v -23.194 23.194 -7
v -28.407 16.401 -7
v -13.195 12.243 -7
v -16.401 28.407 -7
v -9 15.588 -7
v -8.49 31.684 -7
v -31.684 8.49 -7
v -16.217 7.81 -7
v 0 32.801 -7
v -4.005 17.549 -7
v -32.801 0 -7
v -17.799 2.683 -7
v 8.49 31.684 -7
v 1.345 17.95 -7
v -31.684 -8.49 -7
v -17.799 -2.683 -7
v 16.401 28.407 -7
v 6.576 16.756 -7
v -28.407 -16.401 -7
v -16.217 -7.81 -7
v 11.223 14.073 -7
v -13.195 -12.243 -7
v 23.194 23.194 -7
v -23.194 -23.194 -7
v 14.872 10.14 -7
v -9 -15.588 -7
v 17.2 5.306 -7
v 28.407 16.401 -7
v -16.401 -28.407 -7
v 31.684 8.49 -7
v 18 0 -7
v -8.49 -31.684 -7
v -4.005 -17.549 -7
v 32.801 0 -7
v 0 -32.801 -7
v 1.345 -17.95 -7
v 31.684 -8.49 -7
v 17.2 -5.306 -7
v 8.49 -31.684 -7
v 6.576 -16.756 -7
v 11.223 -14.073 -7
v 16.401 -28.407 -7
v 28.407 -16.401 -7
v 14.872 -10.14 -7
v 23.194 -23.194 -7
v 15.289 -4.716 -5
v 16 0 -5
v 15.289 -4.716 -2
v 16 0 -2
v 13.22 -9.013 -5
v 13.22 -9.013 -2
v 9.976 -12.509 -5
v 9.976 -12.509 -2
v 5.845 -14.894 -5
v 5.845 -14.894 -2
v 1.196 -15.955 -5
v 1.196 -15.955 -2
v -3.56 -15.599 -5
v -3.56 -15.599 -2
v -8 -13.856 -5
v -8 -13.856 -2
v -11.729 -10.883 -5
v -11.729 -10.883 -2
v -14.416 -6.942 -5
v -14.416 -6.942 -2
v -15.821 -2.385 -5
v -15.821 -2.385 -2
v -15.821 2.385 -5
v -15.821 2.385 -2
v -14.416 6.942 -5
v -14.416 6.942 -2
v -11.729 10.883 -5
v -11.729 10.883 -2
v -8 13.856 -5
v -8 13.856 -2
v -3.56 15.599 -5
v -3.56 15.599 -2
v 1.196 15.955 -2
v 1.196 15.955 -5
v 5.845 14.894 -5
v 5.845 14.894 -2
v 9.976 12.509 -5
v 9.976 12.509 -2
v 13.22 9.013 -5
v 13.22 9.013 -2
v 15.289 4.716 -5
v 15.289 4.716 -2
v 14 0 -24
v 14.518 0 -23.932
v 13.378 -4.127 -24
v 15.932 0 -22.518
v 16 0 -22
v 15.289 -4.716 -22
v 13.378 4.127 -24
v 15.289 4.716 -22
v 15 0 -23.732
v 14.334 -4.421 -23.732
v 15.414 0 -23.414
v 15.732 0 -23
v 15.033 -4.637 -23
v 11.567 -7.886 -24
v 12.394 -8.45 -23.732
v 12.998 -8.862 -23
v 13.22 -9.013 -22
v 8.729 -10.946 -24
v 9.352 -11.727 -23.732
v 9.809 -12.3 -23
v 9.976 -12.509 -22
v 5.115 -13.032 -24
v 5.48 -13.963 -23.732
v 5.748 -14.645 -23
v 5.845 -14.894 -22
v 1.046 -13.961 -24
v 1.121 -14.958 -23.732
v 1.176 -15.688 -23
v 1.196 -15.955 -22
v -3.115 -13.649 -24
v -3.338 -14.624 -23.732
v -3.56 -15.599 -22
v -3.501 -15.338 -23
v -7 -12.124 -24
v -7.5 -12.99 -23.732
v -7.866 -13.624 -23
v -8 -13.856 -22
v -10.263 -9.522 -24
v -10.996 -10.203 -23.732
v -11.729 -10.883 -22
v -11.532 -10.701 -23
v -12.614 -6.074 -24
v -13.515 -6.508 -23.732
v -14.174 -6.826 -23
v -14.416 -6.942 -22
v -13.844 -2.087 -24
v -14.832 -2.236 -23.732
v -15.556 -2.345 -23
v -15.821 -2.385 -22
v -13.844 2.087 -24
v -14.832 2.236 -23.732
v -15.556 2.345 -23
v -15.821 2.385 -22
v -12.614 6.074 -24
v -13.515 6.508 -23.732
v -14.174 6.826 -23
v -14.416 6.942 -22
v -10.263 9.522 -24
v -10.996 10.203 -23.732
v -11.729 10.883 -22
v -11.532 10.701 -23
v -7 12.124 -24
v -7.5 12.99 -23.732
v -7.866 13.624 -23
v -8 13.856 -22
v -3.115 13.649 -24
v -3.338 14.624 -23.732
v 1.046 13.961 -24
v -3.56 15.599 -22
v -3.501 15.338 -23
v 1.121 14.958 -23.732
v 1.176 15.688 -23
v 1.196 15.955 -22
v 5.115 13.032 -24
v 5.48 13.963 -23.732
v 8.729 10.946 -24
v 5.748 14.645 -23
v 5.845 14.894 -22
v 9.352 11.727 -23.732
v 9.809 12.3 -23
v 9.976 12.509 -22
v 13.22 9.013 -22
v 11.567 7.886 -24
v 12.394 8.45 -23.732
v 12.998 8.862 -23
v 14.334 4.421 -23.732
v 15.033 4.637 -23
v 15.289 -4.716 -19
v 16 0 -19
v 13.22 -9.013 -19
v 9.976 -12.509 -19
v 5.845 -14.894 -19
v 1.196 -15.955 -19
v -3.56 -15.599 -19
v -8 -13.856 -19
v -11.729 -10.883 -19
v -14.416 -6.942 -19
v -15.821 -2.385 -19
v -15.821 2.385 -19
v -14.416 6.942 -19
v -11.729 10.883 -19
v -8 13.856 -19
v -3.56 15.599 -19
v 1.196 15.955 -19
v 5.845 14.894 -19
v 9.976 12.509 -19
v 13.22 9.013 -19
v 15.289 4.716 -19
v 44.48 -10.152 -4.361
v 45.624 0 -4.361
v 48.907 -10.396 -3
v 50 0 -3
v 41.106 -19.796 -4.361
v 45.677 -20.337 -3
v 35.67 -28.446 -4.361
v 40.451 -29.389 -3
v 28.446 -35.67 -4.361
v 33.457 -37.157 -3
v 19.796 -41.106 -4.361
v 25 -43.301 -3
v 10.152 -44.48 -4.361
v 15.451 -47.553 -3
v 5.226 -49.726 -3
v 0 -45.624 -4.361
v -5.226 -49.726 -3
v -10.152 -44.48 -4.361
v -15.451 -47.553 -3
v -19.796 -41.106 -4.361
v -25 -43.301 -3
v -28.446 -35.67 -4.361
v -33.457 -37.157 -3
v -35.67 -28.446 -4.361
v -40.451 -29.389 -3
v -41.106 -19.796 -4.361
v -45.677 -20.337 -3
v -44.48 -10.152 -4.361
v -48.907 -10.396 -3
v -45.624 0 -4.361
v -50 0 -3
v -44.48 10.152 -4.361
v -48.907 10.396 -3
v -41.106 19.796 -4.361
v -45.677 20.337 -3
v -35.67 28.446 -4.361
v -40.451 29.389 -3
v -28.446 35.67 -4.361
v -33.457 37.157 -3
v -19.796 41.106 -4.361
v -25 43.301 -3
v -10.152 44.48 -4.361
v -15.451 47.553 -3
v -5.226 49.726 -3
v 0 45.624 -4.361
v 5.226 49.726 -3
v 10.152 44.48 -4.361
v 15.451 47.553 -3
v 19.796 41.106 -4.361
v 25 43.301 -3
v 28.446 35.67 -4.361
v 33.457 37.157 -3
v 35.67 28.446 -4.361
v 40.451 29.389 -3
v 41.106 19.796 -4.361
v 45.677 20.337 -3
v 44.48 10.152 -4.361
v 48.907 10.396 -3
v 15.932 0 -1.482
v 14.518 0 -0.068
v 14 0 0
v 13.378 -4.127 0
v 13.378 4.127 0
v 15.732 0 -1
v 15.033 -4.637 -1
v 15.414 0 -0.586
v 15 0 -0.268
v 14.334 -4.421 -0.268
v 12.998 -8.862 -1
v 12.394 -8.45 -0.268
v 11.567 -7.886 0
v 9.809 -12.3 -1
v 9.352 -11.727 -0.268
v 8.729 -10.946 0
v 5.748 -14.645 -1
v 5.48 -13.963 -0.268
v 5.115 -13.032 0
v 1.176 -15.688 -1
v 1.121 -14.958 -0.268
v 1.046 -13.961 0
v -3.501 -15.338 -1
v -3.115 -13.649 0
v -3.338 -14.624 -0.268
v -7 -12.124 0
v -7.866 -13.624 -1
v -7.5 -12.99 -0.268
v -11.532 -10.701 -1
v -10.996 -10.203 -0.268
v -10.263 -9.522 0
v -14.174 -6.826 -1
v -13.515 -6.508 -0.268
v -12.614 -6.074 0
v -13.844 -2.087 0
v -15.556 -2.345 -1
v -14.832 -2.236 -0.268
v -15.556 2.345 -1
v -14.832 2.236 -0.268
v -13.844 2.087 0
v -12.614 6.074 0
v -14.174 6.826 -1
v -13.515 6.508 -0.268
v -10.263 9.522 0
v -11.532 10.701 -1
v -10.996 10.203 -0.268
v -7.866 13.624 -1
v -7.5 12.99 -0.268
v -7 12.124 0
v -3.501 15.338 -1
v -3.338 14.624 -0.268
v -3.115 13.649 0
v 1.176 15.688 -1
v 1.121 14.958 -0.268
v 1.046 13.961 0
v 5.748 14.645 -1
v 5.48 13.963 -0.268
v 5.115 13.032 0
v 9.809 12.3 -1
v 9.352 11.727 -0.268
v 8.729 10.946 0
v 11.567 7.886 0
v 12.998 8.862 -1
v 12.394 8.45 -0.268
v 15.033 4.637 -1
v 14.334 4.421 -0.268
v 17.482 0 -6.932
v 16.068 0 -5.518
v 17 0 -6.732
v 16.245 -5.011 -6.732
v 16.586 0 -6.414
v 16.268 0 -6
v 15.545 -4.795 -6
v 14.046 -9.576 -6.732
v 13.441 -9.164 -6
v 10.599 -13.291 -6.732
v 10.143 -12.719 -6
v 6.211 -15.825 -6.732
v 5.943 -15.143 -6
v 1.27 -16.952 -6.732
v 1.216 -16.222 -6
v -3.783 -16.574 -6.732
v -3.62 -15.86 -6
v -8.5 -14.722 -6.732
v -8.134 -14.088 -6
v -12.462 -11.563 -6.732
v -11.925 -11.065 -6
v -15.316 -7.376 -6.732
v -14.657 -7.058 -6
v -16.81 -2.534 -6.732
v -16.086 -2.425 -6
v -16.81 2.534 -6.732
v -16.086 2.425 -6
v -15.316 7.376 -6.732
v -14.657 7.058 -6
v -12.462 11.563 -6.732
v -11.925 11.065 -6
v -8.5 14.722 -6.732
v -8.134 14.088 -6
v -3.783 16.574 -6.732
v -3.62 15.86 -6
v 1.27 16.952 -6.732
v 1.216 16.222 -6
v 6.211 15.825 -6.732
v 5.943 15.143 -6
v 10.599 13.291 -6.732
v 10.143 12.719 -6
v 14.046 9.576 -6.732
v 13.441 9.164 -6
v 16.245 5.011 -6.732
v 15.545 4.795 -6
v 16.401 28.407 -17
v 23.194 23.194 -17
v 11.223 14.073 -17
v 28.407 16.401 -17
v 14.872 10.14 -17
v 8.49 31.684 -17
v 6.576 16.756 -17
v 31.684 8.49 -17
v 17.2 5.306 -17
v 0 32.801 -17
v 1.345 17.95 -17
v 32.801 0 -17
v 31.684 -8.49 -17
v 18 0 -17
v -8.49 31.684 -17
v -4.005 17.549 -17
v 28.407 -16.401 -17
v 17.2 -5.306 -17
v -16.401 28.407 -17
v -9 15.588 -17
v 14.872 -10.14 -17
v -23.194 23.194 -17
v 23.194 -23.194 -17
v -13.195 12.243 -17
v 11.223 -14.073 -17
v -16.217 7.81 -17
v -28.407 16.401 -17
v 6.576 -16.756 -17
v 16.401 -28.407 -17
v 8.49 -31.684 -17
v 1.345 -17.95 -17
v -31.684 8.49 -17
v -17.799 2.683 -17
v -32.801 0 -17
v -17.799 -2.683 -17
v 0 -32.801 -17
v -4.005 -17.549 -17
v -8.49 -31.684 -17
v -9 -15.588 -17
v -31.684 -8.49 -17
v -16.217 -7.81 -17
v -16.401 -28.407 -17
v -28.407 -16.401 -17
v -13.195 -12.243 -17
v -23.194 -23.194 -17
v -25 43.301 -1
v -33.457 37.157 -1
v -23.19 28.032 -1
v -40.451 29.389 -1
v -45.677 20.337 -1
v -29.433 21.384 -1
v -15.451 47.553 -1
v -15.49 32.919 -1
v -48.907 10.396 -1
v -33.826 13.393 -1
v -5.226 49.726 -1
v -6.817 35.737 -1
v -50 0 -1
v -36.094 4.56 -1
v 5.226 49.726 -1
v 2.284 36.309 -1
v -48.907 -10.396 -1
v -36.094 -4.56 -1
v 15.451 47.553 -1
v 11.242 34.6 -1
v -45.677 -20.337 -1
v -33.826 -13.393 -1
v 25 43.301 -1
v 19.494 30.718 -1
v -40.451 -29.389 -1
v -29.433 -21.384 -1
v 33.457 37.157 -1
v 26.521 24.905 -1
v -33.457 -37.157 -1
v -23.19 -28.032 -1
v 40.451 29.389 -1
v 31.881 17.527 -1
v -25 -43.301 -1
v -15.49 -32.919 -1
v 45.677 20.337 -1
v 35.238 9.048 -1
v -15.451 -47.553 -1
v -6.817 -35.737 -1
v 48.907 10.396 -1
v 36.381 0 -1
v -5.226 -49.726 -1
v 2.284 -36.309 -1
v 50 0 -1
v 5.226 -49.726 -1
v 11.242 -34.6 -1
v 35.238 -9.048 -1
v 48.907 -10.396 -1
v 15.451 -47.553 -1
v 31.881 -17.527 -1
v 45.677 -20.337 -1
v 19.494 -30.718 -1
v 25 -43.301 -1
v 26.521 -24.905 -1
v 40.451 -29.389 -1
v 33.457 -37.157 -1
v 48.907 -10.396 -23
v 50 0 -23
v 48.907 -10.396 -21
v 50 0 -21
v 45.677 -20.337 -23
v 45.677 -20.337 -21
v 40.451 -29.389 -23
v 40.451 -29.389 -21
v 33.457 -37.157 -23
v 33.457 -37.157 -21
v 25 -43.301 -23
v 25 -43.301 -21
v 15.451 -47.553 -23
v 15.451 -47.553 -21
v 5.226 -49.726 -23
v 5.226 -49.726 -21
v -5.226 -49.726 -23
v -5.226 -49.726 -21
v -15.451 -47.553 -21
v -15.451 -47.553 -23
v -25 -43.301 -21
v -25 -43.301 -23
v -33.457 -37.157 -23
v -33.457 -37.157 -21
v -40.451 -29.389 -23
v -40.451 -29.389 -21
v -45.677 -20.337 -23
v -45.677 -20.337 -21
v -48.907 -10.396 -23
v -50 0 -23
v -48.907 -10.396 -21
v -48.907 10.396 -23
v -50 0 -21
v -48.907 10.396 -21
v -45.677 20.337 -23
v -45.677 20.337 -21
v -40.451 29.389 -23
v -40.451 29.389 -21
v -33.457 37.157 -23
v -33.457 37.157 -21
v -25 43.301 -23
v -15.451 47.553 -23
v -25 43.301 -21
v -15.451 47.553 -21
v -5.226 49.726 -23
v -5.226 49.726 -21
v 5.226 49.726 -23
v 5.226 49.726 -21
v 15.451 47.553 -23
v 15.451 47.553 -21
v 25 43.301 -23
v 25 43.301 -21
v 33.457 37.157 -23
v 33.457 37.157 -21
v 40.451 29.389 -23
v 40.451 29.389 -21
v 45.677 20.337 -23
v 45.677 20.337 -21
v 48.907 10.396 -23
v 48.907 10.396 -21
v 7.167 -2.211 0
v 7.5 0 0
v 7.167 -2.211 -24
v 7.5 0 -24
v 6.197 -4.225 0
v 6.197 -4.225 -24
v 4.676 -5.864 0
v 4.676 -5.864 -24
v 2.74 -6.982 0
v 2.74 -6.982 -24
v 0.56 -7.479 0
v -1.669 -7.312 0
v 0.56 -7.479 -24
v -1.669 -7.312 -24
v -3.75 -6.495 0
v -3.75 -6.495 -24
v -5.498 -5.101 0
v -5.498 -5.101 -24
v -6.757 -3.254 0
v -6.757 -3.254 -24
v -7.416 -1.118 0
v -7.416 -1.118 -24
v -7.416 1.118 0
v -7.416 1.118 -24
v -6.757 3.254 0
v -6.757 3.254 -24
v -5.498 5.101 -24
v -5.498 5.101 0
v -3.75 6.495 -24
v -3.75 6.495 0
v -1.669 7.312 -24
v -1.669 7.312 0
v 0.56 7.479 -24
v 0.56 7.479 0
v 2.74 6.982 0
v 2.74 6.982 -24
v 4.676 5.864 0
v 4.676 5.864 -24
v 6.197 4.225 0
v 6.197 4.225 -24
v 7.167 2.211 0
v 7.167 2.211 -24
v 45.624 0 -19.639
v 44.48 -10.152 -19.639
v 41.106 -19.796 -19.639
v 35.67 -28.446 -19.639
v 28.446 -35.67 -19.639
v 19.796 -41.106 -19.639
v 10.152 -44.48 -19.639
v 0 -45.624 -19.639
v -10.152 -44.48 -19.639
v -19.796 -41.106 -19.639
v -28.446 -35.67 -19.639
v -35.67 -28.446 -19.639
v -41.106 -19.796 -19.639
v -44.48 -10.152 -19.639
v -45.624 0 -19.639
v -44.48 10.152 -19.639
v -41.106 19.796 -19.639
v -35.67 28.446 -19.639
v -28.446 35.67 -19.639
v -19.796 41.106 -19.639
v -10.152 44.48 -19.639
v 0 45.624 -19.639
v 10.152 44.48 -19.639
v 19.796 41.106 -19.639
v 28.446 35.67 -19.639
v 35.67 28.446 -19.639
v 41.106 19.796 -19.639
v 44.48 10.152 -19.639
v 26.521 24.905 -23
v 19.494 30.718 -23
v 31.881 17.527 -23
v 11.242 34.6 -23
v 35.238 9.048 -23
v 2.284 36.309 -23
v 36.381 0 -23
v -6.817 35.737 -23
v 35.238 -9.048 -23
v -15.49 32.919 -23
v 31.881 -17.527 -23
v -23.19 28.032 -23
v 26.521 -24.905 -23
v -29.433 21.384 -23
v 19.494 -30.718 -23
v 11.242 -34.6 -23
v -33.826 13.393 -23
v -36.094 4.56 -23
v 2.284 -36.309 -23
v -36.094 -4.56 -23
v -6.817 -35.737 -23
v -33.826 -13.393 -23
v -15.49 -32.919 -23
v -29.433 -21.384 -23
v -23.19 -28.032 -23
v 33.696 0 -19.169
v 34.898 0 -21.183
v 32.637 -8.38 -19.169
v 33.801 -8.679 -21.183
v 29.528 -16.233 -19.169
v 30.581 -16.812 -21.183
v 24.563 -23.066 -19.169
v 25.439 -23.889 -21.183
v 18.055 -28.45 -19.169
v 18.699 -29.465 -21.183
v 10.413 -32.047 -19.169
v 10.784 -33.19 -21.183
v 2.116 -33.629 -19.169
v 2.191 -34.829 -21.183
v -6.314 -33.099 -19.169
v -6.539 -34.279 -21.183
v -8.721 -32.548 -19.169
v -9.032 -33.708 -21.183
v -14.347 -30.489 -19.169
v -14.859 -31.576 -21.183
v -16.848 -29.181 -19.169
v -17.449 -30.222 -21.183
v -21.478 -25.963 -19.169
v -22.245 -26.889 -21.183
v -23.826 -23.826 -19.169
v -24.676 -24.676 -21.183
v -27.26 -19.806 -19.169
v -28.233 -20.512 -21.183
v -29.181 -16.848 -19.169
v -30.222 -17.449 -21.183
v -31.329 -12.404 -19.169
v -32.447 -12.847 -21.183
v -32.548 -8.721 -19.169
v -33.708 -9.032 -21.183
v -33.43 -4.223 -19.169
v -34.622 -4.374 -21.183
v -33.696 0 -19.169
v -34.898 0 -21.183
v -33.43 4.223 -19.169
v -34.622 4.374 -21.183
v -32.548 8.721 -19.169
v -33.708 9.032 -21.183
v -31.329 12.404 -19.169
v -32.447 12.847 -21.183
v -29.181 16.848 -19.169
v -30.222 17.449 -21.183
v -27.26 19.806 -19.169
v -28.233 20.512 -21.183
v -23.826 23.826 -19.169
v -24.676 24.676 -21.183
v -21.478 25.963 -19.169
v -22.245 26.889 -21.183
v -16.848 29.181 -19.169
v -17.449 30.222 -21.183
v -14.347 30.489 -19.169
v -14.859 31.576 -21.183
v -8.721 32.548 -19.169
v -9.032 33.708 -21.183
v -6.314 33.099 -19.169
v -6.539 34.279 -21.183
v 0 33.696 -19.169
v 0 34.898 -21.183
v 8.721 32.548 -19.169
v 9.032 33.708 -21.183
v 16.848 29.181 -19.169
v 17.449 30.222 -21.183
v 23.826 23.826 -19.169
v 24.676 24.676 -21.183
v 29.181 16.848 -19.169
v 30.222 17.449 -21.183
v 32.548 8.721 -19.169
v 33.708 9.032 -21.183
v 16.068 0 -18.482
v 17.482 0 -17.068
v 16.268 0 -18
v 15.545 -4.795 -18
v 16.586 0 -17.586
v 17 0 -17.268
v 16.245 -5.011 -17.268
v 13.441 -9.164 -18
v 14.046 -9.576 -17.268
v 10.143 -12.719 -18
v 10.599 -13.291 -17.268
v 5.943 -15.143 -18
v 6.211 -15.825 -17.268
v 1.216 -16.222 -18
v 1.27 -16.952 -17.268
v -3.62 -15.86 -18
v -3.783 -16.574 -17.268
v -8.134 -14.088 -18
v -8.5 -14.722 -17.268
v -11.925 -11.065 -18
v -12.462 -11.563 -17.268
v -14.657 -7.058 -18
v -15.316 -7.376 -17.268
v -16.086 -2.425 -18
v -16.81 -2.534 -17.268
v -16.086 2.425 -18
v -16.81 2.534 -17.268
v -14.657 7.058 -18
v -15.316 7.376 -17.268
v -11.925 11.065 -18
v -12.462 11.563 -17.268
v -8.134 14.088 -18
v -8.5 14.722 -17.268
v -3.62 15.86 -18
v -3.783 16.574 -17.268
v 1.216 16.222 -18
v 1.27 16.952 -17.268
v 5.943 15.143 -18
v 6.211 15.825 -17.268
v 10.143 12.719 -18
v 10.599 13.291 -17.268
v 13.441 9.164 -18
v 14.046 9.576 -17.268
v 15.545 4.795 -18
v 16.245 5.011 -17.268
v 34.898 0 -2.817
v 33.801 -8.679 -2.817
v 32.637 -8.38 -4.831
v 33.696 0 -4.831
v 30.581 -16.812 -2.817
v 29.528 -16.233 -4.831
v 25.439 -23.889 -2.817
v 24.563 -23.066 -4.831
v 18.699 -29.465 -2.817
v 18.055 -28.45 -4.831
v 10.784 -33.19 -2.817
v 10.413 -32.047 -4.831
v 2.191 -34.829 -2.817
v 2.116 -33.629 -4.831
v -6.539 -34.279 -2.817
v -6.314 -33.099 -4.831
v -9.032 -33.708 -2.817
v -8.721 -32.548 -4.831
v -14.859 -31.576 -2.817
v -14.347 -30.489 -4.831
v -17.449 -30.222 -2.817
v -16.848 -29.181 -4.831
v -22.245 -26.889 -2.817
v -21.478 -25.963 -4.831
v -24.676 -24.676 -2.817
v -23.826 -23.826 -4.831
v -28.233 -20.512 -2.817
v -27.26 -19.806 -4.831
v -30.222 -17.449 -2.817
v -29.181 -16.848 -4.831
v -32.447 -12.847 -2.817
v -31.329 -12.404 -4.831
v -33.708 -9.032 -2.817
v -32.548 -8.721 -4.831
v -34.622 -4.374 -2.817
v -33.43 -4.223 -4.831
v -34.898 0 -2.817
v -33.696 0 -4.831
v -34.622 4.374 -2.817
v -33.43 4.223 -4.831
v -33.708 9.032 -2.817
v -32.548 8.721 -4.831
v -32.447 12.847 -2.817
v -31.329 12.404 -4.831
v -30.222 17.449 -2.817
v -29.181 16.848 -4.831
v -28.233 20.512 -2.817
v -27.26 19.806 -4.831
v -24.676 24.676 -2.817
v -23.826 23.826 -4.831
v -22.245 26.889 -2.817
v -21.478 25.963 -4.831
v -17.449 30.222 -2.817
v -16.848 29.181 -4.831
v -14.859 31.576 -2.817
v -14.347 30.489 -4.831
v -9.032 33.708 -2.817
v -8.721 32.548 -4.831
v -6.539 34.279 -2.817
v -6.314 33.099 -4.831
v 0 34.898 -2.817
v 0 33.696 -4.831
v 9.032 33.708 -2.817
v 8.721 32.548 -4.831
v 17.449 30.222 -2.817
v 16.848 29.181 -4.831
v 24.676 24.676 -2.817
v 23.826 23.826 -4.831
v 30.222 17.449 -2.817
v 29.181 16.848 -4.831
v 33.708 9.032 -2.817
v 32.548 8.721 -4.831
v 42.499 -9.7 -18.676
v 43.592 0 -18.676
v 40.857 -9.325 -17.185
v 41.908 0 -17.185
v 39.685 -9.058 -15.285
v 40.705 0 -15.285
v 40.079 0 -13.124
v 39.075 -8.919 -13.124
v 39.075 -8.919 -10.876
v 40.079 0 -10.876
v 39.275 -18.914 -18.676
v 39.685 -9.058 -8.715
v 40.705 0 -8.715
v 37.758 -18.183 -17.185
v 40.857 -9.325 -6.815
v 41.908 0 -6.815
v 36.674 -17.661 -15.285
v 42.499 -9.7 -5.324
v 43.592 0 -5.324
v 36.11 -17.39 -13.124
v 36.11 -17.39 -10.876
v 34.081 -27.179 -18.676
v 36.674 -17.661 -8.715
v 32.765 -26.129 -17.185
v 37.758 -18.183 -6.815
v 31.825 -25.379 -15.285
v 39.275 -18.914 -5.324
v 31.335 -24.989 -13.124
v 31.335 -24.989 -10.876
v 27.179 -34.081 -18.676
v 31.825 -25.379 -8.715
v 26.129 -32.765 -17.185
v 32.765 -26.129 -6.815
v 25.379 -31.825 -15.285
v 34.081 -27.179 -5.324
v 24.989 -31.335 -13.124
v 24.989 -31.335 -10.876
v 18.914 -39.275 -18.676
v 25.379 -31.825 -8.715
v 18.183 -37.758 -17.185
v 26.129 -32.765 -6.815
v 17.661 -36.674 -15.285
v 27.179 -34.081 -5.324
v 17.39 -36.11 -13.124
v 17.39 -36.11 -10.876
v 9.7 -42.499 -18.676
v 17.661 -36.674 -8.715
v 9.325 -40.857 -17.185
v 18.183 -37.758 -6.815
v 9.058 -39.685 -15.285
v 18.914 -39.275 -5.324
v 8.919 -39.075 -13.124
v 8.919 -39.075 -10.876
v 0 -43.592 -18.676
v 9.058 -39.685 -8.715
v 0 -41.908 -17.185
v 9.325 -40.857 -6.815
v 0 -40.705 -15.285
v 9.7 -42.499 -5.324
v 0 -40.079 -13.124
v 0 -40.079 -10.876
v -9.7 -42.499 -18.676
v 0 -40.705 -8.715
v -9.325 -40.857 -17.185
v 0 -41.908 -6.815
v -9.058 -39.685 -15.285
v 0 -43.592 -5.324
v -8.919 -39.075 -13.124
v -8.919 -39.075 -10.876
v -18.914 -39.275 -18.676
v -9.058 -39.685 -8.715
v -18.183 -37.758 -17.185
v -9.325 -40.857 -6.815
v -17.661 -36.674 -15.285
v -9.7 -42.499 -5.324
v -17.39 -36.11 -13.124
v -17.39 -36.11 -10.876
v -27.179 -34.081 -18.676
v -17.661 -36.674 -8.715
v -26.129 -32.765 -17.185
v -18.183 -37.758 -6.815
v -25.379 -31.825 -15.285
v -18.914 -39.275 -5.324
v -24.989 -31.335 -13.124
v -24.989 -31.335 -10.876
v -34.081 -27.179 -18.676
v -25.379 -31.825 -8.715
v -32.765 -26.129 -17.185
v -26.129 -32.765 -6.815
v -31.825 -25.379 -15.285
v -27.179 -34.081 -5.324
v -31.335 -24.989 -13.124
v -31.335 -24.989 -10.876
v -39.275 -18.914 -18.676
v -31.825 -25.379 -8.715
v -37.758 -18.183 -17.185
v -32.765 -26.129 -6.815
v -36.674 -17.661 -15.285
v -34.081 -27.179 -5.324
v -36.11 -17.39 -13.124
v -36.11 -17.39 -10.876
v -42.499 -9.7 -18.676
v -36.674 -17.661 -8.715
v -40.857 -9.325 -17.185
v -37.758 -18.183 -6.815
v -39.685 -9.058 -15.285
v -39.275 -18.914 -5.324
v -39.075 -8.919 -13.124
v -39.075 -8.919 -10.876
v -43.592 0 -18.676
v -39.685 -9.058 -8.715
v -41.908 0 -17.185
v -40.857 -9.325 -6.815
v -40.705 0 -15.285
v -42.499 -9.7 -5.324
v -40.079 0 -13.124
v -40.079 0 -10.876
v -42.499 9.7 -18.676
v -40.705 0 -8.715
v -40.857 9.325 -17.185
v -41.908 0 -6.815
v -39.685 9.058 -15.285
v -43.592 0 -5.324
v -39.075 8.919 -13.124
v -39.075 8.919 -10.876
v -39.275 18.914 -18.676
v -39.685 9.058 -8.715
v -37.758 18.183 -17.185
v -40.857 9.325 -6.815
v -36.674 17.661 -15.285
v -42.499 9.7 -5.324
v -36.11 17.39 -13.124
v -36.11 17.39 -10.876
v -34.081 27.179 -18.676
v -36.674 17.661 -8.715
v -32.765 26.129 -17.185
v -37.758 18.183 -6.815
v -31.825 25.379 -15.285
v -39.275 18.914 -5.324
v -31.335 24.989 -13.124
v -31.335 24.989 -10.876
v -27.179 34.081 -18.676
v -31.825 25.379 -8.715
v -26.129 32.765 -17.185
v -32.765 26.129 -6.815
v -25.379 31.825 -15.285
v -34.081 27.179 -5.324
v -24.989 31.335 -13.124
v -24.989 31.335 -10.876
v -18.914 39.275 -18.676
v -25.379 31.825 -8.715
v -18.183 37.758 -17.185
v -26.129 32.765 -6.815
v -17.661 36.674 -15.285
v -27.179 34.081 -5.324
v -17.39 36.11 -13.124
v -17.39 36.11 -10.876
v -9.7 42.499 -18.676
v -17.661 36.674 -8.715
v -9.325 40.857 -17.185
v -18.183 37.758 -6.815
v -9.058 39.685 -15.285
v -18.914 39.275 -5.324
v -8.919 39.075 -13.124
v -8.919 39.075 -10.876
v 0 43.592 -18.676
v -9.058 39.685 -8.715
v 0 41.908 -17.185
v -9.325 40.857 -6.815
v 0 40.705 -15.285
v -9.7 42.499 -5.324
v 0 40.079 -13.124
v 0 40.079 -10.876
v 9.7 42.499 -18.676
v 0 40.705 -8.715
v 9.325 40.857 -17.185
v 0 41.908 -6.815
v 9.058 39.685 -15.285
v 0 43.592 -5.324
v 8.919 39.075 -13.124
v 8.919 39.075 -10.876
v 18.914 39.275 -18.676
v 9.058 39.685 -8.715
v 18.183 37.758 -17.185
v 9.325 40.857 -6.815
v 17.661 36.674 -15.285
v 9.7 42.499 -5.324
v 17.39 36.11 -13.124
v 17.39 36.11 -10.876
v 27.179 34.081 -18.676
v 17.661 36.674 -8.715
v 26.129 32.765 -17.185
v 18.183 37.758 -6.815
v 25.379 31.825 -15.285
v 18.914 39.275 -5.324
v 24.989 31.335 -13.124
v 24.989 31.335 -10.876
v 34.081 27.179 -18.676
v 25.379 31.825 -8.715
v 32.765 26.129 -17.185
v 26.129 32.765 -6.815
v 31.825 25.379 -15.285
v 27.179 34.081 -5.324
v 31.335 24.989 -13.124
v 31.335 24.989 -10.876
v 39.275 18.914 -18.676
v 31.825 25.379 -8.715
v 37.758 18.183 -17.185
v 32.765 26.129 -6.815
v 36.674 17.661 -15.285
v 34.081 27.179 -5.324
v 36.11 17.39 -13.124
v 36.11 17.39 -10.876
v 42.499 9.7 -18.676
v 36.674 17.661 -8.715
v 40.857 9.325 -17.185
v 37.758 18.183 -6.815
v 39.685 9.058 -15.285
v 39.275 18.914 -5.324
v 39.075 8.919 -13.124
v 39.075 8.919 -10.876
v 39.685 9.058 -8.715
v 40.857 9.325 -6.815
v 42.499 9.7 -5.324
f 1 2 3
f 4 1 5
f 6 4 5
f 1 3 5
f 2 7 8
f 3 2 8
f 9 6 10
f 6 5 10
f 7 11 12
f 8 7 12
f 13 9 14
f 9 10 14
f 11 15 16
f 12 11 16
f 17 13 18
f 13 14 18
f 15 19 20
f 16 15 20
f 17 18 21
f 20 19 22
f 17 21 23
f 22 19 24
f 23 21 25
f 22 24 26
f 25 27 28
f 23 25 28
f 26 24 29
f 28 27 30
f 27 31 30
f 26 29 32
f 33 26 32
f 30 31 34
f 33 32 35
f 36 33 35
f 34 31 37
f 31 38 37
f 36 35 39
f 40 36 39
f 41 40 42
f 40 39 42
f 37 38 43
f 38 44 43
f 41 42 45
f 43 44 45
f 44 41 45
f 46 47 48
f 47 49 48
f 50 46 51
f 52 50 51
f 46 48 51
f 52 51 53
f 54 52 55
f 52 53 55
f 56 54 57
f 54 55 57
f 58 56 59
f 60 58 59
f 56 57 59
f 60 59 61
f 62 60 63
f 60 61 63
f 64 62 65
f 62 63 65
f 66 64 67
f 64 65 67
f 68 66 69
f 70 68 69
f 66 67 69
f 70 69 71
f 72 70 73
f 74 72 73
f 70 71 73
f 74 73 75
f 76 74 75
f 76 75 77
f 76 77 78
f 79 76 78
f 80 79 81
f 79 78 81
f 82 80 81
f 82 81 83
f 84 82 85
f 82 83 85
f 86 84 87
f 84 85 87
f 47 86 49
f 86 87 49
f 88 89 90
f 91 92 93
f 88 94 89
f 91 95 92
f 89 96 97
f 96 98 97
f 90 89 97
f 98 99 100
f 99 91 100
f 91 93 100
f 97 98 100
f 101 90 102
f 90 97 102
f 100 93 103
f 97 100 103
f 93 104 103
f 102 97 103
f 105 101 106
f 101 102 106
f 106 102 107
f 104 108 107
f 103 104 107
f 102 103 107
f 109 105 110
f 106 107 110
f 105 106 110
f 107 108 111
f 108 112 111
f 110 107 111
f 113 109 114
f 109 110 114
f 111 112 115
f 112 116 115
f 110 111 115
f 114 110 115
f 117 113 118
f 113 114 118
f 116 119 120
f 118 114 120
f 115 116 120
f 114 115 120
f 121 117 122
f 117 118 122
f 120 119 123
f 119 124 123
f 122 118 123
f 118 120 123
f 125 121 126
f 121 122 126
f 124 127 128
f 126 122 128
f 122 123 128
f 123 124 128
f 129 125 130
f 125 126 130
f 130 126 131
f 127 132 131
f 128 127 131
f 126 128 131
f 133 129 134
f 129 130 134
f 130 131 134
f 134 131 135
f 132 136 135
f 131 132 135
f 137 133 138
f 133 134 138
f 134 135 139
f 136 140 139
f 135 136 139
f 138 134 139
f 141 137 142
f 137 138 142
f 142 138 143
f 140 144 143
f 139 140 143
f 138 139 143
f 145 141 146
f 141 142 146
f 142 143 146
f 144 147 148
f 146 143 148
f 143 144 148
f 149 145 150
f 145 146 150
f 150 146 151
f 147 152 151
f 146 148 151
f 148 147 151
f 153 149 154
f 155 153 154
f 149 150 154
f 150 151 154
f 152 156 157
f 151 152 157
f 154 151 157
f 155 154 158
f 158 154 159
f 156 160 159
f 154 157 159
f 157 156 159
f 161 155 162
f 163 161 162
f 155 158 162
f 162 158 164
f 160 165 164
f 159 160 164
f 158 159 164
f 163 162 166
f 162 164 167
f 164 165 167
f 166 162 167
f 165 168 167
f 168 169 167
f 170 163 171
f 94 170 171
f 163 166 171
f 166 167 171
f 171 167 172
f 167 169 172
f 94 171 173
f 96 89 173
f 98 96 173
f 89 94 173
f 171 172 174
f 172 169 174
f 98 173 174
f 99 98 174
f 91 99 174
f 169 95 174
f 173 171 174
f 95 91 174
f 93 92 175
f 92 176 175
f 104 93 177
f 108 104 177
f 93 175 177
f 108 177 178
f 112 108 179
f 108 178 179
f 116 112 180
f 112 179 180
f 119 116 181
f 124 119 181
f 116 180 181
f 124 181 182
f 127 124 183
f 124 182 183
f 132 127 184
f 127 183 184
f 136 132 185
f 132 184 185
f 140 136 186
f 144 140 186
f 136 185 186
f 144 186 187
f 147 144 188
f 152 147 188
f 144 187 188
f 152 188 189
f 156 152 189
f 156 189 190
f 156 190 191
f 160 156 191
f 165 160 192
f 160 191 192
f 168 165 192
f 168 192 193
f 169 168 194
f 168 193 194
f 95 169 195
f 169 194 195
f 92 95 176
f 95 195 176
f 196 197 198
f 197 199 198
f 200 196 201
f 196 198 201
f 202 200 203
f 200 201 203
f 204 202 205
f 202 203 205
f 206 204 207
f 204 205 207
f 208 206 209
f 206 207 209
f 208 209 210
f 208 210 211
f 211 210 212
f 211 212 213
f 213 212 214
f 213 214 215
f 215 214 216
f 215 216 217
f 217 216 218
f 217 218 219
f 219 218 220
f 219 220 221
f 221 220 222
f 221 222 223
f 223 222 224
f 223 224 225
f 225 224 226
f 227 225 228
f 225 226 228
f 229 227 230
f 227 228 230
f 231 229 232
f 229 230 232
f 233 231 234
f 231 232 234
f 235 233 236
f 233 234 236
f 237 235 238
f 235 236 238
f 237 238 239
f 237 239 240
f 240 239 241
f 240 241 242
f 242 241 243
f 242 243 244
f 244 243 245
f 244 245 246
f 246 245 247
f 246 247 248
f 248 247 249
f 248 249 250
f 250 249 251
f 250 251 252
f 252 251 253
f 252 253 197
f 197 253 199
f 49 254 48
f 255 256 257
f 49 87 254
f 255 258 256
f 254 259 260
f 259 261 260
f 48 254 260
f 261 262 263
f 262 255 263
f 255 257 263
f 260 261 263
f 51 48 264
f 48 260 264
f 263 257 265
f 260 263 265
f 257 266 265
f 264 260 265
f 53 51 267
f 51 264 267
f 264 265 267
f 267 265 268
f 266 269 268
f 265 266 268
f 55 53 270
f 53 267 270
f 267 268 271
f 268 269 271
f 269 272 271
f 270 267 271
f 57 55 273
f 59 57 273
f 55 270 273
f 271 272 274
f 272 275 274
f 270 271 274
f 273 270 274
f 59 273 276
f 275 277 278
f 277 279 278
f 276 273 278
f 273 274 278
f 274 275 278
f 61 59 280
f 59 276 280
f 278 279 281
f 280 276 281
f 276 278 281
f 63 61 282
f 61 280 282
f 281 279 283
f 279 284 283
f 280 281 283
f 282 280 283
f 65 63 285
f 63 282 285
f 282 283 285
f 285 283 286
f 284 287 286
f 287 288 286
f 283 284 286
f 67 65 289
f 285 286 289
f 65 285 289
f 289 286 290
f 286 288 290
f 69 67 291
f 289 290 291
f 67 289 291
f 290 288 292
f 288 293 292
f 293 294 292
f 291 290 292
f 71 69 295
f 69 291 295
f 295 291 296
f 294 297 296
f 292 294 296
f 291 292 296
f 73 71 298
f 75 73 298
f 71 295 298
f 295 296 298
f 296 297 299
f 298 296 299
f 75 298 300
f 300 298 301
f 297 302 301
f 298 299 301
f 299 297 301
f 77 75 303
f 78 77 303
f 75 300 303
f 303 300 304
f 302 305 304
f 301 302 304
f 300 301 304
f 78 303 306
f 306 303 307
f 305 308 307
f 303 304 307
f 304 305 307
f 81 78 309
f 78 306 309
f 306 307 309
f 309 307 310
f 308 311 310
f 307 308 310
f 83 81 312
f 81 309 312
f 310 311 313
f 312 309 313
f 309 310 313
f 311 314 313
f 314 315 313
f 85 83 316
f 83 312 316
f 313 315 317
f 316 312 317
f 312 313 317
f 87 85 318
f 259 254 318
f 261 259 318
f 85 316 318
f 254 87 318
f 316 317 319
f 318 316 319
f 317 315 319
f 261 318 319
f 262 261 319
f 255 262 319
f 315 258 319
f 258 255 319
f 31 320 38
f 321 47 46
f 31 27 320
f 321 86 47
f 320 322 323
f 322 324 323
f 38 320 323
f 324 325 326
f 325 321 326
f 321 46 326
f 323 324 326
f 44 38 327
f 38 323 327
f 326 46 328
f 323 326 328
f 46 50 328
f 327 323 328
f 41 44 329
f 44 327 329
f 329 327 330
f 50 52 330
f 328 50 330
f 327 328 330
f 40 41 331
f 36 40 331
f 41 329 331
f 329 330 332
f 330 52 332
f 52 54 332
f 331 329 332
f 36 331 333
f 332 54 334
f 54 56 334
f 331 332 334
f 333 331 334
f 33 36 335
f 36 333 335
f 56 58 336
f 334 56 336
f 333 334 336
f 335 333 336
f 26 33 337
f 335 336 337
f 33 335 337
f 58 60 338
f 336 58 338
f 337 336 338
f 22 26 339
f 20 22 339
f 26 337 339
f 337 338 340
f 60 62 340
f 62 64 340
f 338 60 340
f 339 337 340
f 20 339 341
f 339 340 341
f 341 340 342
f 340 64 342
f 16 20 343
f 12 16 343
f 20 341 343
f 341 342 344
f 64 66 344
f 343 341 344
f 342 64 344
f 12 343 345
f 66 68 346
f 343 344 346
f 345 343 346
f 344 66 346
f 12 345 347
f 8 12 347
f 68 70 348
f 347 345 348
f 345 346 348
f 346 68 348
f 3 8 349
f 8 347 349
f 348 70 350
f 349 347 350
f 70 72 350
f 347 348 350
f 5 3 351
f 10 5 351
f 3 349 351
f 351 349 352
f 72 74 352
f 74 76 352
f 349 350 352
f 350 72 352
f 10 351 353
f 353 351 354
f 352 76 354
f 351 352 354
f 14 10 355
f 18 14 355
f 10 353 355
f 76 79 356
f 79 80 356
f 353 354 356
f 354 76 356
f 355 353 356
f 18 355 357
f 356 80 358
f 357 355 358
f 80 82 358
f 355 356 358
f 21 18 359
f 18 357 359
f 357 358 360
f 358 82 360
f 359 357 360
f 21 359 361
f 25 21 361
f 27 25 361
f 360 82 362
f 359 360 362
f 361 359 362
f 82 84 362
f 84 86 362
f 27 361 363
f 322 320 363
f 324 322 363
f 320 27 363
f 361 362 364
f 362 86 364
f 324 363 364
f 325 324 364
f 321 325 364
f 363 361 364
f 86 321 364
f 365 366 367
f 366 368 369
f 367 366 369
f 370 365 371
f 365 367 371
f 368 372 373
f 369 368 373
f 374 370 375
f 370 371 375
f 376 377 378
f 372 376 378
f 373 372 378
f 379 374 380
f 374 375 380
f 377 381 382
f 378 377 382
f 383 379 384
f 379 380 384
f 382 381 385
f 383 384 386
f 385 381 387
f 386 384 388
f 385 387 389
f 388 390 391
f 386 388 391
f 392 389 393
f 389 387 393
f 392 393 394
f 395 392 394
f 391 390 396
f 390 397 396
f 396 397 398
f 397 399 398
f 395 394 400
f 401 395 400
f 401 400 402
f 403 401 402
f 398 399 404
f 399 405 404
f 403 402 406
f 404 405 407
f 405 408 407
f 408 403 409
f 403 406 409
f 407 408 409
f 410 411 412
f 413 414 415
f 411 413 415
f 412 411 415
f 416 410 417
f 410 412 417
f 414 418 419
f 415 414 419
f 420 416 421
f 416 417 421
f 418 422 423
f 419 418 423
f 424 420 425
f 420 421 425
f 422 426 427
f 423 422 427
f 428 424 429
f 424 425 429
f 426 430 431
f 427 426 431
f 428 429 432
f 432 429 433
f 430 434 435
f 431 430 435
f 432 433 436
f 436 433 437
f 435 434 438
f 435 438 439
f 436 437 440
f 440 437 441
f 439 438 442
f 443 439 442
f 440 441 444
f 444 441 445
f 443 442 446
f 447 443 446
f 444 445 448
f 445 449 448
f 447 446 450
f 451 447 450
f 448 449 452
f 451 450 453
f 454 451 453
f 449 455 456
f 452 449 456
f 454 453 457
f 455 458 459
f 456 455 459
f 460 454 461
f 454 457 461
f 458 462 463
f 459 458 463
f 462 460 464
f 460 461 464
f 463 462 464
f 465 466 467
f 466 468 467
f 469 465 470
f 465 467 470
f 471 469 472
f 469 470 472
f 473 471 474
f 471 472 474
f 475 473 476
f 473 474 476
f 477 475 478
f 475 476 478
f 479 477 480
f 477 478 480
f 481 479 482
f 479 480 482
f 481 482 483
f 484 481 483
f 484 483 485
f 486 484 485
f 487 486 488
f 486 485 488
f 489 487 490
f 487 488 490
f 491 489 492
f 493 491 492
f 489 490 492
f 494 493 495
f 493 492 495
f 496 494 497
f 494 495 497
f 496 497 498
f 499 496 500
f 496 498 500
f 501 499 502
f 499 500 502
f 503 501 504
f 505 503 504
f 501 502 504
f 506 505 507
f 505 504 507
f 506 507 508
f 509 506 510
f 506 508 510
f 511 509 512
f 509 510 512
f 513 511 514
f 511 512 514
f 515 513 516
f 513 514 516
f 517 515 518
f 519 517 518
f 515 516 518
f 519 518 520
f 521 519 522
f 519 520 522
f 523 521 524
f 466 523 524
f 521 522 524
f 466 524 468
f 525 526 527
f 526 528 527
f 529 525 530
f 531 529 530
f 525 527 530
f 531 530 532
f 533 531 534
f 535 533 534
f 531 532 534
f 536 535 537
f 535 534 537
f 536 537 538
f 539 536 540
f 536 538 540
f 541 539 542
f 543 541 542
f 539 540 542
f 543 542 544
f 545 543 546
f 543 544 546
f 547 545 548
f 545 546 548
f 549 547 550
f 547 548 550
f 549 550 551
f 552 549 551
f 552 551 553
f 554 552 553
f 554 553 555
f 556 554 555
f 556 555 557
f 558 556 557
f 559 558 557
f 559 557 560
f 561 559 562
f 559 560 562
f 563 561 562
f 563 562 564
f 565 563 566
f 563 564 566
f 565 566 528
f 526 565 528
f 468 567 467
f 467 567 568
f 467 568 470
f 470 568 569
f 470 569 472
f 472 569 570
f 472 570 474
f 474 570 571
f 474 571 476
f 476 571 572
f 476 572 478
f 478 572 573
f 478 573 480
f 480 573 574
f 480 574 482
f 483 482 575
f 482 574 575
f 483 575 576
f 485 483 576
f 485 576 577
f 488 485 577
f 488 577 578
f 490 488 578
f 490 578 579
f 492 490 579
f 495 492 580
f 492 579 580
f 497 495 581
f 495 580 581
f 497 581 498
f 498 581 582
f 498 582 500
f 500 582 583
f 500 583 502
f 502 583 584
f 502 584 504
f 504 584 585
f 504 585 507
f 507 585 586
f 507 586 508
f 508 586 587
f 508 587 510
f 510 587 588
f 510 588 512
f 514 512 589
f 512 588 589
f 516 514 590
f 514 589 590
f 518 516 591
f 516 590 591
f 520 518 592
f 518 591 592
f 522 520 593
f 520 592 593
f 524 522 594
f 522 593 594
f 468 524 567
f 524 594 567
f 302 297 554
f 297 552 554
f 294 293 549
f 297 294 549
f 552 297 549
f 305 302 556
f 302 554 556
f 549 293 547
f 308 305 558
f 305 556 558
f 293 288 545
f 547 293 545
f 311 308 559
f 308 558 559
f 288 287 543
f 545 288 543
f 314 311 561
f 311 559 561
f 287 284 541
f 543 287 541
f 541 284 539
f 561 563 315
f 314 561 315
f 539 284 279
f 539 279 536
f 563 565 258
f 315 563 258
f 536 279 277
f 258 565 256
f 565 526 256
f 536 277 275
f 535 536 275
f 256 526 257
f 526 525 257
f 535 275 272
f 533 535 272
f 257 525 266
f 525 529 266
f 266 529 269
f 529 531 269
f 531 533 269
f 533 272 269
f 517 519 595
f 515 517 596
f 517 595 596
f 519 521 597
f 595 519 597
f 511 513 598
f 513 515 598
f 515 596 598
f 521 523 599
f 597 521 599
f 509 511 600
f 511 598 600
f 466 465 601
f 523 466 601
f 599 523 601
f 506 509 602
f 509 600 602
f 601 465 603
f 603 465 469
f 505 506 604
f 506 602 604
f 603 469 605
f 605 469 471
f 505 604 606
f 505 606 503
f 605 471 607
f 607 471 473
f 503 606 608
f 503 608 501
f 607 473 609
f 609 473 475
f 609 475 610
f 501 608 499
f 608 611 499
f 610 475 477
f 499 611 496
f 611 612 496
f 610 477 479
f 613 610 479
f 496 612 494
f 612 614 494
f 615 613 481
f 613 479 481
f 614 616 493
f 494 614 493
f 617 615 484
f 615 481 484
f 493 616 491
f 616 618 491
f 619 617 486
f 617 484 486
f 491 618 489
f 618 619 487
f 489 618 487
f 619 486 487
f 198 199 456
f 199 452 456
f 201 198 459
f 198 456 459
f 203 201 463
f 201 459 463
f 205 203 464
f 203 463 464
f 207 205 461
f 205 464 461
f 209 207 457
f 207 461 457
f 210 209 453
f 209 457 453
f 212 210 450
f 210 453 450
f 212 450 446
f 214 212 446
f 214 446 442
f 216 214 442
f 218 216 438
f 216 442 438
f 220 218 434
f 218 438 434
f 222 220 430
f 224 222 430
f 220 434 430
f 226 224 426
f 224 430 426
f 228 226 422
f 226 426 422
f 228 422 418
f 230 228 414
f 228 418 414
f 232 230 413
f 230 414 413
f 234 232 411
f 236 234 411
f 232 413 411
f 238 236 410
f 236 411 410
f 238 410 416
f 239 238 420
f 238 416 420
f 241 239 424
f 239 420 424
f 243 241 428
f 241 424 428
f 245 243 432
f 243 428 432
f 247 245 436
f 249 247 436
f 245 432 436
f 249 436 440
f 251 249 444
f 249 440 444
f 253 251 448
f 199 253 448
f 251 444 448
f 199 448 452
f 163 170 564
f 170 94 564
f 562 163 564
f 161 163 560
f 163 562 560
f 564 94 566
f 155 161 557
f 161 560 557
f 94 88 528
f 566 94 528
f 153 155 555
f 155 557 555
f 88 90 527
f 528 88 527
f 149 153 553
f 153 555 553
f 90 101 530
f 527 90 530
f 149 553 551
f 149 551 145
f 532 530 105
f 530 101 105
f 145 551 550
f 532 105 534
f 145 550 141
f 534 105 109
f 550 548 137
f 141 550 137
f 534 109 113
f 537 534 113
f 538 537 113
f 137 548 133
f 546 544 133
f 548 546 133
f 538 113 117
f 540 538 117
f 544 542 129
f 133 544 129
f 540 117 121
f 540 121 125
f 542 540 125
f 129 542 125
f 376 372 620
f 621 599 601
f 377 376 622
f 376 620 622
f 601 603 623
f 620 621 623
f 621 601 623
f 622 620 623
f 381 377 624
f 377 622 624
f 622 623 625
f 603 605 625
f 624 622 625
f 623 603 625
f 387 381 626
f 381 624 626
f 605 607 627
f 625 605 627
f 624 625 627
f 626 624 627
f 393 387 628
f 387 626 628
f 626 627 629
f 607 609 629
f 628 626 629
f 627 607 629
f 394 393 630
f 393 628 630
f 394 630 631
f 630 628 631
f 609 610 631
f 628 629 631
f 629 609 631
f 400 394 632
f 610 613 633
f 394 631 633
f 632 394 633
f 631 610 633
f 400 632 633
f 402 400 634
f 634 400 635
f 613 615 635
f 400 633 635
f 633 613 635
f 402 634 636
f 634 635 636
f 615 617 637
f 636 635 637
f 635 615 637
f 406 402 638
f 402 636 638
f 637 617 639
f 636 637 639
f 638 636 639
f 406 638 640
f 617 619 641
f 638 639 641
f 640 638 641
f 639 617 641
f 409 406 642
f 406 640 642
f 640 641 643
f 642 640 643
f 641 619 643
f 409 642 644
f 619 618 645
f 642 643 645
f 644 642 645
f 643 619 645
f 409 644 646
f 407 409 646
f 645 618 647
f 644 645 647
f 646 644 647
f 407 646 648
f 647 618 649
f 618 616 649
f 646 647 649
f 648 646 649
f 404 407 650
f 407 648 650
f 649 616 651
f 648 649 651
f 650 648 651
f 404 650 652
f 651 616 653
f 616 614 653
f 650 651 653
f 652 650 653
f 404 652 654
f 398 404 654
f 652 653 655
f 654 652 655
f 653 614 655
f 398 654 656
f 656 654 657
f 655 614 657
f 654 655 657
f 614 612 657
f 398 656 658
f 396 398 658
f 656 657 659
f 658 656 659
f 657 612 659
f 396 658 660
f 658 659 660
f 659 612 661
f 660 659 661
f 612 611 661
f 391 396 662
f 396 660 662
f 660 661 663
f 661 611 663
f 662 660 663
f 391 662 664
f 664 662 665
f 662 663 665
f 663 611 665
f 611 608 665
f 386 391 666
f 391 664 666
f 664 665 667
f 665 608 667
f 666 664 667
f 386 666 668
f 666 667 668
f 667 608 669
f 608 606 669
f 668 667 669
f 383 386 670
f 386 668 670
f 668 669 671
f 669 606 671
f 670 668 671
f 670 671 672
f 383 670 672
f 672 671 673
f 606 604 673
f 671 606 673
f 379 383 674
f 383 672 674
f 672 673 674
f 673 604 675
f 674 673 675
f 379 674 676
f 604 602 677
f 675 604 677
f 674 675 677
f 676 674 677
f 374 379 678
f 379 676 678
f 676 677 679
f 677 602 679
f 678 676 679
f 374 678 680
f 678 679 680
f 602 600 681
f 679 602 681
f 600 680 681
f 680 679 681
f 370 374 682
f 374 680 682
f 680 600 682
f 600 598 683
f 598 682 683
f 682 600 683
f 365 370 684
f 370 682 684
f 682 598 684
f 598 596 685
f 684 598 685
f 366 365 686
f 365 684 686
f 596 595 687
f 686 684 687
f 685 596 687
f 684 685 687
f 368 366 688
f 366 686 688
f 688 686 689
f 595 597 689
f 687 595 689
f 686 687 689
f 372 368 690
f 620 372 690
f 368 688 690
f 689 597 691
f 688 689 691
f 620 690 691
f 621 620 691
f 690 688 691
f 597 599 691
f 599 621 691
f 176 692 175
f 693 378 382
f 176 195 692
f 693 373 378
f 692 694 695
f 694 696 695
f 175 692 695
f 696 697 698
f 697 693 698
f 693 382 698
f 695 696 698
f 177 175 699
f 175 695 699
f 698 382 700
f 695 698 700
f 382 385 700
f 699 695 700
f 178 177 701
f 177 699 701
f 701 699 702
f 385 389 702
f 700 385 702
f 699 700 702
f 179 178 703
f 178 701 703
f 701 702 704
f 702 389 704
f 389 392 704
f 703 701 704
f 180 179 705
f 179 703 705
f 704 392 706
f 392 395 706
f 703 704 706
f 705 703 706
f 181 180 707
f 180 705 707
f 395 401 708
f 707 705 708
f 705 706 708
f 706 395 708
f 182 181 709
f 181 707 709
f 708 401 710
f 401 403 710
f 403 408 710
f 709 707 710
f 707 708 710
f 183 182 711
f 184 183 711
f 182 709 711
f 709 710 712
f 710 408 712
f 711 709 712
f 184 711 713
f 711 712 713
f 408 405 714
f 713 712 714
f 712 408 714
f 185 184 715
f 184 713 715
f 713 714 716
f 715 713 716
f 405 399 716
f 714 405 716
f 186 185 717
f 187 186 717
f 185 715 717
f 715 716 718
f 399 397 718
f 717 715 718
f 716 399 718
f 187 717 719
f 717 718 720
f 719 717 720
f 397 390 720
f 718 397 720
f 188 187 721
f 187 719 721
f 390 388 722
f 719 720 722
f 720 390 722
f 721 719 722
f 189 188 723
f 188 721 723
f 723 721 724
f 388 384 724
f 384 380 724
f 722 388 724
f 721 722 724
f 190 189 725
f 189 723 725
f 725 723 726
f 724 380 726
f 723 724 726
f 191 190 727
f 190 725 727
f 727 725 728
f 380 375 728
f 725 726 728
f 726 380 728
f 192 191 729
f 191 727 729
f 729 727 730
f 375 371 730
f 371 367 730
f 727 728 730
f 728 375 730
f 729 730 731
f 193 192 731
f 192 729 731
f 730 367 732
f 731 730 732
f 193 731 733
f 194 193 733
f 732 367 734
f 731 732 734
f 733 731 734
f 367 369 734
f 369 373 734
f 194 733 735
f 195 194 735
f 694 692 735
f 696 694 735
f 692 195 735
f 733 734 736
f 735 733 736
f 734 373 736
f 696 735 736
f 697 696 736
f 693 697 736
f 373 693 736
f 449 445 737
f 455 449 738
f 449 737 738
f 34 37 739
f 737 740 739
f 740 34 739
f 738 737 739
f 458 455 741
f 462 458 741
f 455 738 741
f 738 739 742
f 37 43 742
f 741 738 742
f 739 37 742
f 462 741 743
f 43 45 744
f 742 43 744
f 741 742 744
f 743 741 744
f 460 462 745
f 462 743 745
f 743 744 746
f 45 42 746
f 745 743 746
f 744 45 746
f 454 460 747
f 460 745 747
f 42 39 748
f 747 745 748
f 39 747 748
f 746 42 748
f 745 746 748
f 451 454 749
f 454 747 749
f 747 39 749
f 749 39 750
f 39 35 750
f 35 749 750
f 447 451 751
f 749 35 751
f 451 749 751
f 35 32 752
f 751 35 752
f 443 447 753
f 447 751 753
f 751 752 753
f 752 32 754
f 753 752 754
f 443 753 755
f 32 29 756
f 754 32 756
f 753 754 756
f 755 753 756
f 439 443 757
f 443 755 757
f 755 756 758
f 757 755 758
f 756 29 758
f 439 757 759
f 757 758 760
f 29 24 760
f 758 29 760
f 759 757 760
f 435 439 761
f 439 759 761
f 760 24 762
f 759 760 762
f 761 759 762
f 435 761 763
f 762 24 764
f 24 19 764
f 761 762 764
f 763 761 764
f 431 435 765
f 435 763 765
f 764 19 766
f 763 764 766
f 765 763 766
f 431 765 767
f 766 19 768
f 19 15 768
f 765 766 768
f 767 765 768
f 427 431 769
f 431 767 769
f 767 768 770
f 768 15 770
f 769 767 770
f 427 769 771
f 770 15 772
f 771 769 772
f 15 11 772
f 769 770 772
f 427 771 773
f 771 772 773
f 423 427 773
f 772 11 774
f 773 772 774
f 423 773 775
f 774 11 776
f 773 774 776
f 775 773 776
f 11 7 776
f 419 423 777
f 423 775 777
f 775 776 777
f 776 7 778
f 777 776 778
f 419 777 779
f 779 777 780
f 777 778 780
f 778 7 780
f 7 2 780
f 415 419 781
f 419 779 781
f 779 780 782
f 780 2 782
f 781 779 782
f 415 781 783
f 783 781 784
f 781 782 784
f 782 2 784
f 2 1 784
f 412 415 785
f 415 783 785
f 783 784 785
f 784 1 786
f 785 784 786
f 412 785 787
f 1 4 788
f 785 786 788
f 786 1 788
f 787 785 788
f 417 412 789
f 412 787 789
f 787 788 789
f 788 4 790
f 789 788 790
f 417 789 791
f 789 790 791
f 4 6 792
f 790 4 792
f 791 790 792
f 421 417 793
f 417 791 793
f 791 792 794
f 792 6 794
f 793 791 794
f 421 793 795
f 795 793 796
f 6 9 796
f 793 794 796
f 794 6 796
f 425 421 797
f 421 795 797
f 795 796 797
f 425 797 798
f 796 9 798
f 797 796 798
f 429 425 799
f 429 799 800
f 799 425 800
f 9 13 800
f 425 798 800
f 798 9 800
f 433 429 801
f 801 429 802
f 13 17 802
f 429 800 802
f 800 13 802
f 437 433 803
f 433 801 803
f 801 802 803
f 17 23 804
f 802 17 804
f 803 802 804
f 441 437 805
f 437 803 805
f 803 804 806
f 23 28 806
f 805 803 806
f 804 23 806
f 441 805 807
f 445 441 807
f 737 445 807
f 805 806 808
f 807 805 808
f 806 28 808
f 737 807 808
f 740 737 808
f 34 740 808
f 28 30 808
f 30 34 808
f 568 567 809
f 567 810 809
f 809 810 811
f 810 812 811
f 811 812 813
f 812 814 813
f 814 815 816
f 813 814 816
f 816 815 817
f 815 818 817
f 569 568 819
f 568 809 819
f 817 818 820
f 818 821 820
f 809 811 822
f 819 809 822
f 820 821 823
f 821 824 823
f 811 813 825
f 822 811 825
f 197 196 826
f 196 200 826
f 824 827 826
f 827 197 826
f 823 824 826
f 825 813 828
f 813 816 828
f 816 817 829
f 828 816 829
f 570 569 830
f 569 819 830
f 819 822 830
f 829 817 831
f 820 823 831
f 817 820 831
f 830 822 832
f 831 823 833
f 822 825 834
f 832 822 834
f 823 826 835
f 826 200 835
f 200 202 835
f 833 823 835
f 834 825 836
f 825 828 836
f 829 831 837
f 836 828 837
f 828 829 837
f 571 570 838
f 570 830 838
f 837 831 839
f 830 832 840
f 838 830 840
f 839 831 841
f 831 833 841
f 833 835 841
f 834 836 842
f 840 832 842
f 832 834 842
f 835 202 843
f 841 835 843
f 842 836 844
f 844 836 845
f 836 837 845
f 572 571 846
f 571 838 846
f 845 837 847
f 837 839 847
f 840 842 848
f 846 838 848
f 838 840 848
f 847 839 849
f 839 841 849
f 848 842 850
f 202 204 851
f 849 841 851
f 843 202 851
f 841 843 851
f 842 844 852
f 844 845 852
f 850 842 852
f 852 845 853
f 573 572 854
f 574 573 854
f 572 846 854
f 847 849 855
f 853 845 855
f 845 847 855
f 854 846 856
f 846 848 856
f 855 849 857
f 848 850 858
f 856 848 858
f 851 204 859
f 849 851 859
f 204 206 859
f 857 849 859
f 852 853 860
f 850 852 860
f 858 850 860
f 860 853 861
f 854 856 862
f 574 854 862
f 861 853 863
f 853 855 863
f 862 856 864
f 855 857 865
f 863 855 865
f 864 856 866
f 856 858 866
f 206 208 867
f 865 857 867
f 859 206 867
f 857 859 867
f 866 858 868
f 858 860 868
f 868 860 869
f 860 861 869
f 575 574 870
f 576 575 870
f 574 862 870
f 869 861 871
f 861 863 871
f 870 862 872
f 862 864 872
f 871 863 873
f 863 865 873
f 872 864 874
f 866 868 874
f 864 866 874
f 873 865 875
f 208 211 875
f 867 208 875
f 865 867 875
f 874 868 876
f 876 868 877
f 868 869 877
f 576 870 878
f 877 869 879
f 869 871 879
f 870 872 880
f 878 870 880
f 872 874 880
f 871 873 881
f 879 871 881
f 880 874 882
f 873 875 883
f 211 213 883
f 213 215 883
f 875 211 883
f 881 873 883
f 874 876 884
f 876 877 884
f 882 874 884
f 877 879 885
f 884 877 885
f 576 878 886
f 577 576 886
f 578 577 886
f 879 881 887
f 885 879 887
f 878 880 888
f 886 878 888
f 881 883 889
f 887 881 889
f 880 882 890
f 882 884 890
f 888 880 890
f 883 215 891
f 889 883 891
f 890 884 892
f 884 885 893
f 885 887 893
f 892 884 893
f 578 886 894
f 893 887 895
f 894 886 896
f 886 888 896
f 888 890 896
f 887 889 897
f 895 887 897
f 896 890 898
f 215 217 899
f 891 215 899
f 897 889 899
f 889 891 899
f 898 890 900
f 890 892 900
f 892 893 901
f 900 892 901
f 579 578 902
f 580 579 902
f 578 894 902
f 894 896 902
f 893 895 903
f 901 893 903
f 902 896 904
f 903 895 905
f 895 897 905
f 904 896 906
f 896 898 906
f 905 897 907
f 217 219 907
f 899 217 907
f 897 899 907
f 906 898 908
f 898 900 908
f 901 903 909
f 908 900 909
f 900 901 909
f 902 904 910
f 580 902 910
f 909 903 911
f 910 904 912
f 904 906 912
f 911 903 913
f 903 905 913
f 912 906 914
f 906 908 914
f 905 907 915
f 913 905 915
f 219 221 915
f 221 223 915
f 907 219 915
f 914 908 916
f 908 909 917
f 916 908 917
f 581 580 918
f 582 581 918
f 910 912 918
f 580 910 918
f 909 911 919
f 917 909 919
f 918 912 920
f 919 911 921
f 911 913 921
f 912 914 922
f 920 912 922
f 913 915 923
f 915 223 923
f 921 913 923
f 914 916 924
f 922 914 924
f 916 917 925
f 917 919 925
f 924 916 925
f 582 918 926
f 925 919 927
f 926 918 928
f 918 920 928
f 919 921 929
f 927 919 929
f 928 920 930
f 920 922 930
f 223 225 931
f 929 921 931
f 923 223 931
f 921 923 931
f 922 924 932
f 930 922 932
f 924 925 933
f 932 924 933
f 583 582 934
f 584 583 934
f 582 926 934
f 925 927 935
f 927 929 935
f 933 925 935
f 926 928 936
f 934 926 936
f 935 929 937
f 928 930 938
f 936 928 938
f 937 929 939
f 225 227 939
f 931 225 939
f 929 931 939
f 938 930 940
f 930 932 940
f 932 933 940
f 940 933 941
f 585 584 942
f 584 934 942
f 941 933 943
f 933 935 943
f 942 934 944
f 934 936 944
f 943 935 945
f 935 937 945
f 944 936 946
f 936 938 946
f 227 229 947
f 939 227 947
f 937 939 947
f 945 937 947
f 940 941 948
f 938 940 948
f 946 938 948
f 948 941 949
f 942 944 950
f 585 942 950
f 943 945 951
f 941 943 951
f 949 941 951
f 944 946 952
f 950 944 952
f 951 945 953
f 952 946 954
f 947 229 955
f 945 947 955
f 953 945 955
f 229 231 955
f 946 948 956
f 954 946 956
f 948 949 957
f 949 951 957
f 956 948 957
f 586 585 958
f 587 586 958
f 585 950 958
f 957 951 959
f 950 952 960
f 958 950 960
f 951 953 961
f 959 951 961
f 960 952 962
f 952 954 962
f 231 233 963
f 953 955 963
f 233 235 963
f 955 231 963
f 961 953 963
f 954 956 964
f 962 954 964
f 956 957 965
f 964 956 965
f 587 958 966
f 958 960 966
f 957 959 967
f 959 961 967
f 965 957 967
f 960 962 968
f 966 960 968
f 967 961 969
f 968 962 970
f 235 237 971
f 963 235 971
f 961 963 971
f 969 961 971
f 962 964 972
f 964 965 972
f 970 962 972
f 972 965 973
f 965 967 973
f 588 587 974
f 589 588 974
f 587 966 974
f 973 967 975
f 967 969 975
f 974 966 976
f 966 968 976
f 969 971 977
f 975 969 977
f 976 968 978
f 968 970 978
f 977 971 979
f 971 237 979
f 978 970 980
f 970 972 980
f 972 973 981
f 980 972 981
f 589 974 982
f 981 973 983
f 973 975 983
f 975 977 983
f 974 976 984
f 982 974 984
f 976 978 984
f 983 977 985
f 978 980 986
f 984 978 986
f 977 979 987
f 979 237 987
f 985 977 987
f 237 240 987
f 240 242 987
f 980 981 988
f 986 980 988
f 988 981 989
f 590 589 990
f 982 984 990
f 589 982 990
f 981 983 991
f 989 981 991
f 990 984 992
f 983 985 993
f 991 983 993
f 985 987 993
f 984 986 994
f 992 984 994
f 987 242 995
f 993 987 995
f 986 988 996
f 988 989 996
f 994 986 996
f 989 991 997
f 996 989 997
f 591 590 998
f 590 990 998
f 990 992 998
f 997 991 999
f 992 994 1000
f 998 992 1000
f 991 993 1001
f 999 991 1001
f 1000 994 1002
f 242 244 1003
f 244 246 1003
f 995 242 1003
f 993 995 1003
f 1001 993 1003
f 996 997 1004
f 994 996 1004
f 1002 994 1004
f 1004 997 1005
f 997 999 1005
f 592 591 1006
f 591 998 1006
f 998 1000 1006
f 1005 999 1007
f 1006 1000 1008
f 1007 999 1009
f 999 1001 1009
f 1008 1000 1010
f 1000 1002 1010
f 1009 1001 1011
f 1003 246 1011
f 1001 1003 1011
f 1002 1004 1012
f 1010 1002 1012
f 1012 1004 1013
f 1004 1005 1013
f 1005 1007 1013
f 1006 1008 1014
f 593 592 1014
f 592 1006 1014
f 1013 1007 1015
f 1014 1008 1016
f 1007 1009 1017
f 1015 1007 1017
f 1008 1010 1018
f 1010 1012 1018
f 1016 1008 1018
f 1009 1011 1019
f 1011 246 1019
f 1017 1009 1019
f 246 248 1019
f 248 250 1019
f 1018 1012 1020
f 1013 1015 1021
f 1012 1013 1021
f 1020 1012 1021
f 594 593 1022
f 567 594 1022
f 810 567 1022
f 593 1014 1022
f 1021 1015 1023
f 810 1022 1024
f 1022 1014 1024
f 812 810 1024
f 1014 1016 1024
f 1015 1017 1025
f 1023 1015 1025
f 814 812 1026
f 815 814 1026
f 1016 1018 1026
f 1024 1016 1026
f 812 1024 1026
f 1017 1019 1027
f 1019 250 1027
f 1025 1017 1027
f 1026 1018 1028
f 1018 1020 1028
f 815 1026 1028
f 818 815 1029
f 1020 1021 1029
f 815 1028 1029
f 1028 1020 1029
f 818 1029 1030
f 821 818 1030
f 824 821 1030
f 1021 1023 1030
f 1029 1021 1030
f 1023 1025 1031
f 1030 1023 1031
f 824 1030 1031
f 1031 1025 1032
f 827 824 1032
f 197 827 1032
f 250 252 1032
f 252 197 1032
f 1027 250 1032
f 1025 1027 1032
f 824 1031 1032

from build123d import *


with BuildPart() as part:
    # Sketch1 → Revolve1 (revolve)
    with BuildSketch(Plane(origin=(0, 0, 0), x_dir=(1, 0, 0), z_dir=(0, 1, 0))):
        with BuildLine():
            ThreePointArc((32.801315846, 17), (34.259680647, 20.197781656), (36.381049961, 23))
            Line((36.381049961, 23), (49.999989289, 23))
            Line((49.999989289, 23), (49.999989289, 21.000034438))
            Line((49.999989289, 21.000034438), (45.624111056, 19.639054374))
            ThreePointArc((45.624111056, 19.639054374), (40, 12), (45.624111056, 4.360945626))
            Line((45.624111056, 4.360945626), (49.999989289, 2.999965562))
            Line((49.999989289, 2.999965562), (49.999989289, 1))
            Line((49.999989289, 1), (36.381049961, 1))
            ThreePointArc((36.381049961, 1), (34.259680647, 3.802218344), (32.801315846, 7))
            Line((32.801315846, 7), (18, 7))
            ThreePointArc((18, 7), (16.585786438, 6.414213562), (16, 5))
            Line((16, 5), (16, 2))
            ThreePointArc((16, 2), (15.414213562, 0.585786438), (14, 0))
            Line((14, 0), (7.5, 0))
            Line((7.5, 0), (7.5, 12))
            Line((7.5, 12), (7.5, 24))
            Line((7.5, 24), (14, 24))
            ThreePointArc((14, 24), (15.414213562, 23.414213562), (16, 22))
            Line((16, 22), (16, 19))
            ThreePointArc((16, 19), (16.585786438, 17.585786438), (18, 17))
            Line((18, 17), (32.801315846, 17))
        make_face()
    revolve(axis=Axis((0, 0, 0), (0, 0, -1)))


solid = part.part
